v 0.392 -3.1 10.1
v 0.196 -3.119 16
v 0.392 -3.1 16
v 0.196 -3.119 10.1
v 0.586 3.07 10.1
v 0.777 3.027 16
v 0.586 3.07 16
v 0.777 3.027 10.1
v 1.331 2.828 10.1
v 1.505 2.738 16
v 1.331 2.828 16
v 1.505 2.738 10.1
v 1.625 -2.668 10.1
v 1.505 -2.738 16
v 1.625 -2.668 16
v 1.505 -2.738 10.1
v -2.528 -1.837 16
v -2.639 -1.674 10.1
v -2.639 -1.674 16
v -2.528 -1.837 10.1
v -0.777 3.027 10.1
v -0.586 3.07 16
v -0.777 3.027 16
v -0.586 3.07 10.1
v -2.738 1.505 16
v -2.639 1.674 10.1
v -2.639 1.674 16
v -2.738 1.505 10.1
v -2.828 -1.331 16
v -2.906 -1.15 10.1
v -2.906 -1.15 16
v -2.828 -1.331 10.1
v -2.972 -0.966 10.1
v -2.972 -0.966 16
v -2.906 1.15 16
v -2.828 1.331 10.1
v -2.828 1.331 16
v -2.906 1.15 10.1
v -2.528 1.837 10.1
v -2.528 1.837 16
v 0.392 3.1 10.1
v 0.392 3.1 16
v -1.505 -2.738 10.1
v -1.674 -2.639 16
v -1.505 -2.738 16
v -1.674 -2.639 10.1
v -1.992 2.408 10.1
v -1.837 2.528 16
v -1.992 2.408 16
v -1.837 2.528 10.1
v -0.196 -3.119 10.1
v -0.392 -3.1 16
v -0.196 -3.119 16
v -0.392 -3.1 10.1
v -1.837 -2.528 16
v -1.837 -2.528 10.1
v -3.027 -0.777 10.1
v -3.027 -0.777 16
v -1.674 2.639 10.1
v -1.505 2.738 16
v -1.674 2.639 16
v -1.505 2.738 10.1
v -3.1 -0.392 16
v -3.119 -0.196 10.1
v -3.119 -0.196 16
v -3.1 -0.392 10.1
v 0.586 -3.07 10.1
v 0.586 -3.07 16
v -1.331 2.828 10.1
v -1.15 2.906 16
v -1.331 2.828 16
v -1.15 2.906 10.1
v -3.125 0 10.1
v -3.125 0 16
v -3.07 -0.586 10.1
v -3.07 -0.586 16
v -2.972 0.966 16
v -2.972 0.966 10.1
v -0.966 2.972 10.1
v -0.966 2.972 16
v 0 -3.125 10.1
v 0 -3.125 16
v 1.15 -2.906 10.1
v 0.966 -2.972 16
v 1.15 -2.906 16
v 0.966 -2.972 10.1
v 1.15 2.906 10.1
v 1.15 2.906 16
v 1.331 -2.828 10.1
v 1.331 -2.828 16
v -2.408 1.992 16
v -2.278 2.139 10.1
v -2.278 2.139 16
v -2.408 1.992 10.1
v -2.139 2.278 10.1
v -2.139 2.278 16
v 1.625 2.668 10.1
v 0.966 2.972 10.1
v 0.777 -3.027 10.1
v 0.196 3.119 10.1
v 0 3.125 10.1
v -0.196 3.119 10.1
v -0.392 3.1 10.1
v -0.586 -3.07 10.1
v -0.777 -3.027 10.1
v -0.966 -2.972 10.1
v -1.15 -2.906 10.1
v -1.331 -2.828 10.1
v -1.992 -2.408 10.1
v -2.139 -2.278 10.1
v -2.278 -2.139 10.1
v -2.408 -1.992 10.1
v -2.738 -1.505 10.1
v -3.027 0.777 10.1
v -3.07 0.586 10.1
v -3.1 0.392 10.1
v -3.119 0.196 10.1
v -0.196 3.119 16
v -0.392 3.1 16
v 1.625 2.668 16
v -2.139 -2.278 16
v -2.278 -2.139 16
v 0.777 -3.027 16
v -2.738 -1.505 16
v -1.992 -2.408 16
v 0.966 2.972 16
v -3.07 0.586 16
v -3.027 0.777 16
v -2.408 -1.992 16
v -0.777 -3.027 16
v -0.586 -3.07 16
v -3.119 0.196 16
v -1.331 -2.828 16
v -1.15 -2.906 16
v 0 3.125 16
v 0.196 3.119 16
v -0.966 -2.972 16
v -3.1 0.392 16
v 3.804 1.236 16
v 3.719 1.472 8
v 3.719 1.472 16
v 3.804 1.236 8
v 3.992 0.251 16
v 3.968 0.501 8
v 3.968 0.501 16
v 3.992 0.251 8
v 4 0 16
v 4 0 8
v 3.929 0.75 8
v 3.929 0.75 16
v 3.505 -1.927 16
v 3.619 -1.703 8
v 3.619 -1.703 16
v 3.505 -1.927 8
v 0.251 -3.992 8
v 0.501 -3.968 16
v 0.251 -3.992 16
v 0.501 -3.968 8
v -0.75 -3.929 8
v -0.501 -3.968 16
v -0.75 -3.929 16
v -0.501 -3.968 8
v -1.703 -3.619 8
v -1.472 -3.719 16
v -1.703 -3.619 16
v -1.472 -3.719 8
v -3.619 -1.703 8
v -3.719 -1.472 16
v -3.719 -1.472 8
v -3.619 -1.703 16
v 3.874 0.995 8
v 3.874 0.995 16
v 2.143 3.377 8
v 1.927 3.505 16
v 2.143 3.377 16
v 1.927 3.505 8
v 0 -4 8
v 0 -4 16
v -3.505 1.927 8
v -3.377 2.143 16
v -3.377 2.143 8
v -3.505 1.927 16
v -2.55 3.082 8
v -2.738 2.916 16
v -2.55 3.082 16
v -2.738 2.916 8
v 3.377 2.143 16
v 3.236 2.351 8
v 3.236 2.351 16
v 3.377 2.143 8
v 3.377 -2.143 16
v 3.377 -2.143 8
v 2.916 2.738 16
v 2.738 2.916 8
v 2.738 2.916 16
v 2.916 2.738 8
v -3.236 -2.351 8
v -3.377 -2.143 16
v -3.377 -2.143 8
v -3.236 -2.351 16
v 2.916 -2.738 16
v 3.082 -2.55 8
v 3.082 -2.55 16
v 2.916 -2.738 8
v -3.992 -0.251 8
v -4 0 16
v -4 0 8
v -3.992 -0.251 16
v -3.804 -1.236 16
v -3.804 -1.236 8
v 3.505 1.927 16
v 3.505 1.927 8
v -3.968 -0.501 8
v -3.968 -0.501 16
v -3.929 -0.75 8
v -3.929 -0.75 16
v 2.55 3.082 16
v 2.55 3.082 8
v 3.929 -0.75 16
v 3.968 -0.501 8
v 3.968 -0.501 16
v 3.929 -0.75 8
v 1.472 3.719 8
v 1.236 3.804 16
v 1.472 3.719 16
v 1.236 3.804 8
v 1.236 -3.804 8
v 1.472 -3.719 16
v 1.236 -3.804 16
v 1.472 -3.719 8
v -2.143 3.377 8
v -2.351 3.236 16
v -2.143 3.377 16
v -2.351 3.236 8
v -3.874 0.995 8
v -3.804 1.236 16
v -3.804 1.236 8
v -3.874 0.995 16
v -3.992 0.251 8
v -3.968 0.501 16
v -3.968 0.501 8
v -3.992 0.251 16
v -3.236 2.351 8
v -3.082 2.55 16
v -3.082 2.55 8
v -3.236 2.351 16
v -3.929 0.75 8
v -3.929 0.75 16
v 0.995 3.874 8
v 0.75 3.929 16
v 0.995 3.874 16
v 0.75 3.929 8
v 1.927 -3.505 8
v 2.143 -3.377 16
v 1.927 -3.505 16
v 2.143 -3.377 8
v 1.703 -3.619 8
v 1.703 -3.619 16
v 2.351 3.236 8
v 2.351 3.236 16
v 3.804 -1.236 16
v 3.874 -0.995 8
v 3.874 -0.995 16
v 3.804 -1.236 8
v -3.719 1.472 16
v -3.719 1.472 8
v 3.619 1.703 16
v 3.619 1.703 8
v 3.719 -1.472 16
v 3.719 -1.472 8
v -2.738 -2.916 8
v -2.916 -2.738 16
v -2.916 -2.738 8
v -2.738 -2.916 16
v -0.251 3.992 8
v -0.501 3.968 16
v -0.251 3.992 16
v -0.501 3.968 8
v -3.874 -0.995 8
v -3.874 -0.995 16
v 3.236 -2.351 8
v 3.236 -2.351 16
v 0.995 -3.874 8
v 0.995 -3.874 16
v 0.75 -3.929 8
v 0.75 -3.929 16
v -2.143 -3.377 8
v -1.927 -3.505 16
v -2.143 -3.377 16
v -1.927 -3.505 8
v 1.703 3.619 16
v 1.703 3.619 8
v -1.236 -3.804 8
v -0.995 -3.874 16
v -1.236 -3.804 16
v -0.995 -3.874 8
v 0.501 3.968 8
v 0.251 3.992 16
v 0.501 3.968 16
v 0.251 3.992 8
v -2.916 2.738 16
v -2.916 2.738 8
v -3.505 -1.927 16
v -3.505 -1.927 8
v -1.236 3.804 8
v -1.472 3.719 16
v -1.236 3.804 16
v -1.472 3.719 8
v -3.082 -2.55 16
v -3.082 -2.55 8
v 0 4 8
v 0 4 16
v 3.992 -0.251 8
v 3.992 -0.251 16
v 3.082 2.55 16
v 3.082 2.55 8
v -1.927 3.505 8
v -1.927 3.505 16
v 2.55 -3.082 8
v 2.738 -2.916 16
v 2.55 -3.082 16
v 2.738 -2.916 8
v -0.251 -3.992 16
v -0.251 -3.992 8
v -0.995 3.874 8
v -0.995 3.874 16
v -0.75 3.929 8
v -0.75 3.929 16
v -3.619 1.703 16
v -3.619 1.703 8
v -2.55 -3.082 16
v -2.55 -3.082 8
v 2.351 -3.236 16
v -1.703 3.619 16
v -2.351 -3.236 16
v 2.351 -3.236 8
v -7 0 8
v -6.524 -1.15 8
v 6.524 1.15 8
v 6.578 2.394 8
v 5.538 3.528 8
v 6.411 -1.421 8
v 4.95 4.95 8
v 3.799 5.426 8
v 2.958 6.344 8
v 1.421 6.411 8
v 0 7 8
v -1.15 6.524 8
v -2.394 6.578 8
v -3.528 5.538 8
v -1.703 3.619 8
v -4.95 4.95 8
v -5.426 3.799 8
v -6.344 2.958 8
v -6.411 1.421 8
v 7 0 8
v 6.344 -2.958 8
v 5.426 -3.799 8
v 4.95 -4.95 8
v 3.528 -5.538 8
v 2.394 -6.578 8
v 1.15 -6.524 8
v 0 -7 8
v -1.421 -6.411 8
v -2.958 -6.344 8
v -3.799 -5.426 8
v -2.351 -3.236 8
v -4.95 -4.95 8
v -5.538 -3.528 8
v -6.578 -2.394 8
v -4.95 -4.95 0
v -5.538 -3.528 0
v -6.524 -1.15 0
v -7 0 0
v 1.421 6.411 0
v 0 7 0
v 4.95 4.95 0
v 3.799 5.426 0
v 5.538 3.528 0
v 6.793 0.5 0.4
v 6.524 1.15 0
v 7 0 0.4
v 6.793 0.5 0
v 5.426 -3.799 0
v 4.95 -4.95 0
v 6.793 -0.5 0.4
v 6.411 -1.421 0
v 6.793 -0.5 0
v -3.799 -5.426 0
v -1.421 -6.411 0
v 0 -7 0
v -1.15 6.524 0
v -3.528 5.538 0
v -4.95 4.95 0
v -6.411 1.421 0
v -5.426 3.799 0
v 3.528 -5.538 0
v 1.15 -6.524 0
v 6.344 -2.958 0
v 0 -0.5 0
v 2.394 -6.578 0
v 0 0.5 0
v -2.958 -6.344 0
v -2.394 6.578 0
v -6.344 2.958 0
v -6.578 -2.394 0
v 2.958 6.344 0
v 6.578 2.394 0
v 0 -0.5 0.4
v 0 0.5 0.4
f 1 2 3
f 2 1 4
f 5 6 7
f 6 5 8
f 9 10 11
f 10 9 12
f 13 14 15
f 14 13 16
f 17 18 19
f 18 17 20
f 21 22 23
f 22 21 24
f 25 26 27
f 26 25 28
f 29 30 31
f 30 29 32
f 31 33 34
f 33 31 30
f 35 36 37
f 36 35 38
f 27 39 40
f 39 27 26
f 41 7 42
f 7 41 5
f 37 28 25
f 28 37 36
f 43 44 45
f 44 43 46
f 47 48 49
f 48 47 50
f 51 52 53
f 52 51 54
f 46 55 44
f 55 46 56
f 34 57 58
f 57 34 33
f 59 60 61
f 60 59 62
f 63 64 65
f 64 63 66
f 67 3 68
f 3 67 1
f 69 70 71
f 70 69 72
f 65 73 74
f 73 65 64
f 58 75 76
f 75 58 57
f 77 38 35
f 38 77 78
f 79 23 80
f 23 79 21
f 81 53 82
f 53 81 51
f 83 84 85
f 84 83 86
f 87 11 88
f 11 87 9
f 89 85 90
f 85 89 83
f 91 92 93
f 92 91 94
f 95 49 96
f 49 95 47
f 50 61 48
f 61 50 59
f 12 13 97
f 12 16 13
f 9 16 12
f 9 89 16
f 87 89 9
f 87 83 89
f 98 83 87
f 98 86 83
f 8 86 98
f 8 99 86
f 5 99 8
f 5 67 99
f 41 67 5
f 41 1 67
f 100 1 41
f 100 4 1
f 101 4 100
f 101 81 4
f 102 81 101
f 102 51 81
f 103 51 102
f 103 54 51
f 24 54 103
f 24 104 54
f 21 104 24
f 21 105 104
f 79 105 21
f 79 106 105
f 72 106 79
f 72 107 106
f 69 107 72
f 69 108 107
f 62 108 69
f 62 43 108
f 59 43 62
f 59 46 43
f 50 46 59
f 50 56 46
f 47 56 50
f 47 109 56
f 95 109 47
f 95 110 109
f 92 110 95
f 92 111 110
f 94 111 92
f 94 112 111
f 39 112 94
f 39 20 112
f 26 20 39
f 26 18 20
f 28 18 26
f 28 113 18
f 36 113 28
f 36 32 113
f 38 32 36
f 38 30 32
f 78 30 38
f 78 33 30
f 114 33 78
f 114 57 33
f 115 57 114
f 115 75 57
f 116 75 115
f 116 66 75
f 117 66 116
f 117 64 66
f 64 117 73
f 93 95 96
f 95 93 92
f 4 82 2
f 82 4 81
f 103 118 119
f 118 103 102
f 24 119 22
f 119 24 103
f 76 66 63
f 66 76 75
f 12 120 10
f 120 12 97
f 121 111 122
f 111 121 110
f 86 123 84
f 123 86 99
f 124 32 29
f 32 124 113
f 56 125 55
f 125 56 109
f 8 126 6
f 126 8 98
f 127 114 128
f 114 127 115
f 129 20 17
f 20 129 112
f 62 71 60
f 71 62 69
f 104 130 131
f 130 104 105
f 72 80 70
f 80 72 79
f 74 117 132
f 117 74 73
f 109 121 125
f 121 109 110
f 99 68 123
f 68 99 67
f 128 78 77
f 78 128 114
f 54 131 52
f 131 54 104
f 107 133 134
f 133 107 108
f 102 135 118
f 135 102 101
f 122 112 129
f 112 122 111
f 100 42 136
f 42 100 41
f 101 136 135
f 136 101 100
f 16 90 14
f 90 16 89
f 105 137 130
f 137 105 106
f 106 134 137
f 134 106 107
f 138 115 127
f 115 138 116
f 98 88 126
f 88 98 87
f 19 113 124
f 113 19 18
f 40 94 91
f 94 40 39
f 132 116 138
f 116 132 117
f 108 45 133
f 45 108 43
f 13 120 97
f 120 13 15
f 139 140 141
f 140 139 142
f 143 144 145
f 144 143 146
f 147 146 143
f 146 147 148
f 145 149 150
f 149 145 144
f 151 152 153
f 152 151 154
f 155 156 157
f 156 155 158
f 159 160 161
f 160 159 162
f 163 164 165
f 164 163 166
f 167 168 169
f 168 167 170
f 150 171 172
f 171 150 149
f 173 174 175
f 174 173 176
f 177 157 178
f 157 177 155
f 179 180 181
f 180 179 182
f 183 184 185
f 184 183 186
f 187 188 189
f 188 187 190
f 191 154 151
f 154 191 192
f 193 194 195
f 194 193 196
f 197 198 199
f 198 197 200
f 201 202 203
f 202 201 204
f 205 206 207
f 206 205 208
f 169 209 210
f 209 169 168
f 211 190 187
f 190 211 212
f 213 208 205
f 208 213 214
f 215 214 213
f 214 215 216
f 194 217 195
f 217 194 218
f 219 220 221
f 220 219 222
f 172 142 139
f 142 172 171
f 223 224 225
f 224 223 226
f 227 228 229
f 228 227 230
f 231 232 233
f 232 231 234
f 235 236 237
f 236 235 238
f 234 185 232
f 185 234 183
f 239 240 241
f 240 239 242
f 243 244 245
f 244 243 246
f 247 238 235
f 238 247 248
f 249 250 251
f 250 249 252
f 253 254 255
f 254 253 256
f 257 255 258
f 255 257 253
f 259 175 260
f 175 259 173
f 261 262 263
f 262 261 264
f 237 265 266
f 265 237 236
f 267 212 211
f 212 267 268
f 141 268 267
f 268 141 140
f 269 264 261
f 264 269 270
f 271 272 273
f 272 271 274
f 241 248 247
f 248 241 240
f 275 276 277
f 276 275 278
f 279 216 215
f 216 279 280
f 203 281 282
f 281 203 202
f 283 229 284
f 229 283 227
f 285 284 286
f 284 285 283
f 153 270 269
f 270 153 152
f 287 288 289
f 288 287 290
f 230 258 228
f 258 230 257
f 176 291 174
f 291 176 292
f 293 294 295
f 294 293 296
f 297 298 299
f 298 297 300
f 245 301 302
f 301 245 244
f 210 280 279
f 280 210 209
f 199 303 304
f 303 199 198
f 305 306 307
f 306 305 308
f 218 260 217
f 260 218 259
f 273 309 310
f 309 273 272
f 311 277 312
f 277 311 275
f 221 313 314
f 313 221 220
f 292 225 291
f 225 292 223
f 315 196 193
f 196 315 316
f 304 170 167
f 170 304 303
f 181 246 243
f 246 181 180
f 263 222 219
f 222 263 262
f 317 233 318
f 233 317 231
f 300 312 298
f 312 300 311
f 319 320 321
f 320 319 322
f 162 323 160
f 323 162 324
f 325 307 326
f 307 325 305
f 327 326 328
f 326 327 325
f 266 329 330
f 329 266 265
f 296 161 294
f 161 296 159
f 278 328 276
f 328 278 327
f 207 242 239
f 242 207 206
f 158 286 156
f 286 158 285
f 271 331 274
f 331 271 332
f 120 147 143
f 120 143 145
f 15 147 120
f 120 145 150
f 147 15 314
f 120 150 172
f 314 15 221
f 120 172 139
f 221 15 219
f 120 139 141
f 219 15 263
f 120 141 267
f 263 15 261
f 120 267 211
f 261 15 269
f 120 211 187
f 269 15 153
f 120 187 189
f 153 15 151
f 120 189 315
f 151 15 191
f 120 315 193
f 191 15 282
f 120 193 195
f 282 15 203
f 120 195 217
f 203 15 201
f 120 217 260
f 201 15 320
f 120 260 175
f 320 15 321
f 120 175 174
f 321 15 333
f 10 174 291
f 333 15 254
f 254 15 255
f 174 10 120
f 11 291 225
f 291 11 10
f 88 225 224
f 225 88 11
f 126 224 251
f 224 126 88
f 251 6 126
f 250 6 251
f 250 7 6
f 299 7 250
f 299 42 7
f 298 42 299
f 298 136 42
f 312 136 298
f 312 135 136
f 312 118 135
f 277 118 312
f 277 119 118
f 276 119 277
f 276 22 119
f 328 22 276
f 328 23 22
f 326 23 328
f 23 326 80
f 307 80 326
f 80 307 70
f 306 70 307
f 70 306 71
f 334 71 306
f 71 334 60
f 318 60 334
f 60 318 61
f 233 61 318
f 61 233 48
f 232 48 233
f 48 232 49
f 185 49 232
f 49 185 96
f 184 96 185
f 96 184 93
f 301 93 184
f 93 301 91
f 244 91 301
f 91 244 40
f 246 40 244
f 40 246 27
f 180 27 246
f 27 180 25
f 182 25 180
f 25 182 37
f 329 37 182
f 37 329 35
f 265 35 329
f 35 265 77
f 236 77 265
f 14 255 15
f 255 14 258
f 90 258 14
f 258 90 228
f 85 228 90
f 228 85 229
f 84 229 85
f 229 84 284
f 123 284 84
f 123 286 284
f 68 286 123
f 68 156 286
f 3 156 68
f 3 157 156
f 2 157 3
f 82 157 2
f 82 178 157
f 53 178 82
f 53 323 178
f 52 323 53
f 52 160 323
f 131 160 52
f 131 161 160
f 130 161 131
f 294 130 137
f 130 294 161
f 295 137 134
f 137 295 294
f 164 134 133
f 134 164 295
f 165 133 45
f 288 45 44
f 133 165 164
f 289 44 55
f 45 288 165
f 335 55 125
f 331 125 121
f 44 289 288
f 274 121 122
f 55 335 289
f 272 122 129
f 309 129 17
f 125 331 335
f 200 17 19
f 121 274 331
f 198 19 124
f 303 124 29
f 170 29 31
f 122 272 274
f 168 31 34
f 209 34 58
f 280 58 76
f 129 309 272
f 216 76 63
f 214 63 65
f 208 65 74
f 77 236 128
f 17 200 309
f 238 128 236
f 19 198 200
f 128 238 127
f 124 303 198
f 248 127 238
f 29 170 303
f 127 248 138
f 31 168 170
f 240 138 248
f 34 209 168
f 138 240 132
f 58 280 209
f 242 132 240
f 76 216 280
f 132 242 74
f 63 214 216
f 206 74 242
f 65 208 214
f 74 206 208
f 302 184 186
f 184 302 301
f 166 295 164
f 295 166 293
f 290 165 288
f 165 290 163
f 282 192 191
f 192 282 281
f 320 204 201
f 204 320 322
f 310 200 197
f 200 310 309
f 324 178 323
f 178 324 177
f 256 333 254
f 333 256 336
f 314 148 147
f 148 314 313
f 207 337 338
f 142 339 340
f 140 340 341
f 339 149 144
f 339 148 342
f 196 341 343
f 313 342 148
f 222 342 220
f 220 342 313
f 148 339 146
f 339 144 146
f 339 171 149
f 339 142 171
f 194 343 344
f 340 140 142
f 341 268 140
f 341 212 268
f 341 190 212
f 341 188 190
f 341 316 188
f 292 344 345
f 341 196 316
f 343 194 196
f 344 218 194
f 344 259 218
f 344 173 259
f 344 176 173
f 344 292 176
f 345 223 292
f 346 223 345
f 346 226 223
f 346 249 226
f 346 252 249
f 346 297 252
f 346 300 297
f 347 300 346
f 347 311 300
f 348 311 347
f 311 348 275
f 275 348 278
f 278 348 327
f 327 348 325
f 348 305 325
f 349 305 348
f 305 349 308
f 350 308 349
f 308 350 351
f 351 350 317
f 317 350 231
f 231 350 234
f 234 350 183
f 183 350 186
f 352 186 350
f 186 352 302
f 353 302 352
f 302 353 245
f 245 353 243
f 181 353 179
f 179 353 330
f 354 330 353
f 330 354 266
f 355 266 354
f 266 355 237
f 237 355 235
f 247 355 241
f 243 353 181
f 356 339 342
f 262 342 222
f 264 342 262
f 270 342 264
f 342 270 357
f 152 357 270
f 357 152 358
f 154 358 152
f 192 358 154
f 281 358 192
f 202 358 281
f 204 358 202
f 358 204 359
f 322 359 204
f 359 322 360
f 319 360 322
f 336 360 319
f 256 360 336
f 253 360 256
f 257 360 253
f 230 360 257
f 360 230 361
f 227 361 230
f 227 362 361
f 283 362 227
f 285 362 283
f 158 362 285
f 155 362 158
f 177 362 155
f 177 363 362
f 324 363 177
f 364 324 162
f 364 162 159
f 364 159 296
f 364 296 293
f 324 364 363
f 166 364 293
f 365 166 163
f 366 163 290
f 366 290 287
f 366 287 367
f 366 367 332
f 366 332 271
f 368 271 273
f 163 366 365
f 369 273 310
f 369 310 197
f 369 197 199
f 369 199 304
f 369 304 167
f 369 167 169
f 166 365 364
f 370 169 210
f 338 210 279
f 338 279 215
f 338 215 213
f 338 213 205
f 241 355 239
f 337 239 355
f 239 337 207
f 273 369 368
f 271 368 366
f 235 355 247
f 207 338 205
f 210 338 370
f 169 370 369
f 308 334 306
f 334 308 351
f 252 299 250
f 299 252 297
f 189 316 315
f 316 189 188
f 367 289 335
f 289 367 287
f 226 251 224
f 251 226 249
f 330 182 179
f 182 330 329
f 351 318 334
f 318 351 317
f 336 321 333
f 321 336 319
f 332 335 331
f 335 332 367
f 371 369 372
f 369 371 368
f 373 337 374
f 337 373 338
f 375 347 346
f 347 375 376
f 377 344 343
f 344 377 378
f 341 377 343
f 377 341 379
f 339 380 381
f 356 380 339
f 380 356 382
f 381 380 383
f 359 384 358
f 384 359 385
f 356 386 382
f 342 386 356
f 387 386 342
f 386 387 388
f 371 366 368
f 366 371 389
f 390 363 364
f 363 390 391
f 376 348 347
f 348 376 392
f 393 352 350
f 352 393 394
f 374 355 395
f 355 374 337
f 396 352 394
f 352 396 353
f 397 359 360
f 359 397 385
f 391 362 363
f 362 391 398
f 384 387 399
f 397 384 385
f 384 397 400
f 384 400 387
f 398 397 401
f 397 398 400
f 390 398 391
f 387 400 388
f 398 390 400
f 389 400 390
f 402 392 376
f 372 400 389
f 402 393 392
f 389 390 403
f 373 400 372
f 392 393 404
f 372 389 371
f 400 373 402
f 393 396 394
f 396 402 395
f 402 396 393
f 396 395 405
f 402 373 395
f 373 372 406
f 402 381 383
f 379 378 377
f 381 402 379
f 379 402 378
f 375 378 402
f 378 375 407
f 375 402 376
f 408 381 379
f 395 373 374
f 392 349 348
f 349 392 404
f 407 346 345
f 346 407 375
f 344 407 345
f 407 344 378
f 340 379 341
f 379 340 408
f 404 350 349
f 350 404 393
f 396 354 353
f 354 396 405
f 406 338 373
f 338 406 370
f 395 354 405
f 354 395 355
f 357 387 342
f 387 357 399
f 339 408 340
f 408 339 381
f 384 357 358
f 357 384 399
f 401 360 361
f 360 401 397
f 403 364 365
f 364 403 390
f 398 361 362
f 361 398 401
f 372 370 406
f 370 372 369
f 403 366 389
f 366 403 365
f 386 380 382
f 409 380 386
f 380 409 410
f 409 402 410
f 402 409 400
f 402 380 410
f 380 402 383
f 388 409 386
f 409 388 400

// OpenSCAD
// This is only a knob for the prototypes

pot_height=6;
pot_diameter=6.25;
pot_cut_depth=1.5;
stem_diameter=8;
stem_height=8;

head_height=8;
head_diameter=14;
head_fn=8;
$fn=100;
module pot() {
    difference() {
        cylinder(pot_height, pot_diameter/2, pot_diameter/2);
        translate([pot_diameter/2-pot_cut_depth, -pot_diameter/2, -0.1]) cube([pot_diameter, pot_diameter,pot_height+2*0.1]);
    }
}

module stem() {
    difference() {
        cylinder(stem_height, stem_diameter/2,stem_diameter/2);
        translate([0,0,stem_height-pot_height+0.1]) pot();
    }
}

module design_head() {
    translate([0, -0.5, -0.1]) cube([head_diameter/2, 1, 0.5]);
}

module head() {
    difference() { 
    union() {
        cylinder(head_height, head_diameter/2, head_diameter/2, $fn=head_fn);
        rotate([0,0,20]) cylinder(head_height, head_diameter/2, head_diameter/2, $fn=head_fn);
    }
    design_head();
}
}

module full() {
    translate([0,0,head_height]) stem();
    head();
}

full();
